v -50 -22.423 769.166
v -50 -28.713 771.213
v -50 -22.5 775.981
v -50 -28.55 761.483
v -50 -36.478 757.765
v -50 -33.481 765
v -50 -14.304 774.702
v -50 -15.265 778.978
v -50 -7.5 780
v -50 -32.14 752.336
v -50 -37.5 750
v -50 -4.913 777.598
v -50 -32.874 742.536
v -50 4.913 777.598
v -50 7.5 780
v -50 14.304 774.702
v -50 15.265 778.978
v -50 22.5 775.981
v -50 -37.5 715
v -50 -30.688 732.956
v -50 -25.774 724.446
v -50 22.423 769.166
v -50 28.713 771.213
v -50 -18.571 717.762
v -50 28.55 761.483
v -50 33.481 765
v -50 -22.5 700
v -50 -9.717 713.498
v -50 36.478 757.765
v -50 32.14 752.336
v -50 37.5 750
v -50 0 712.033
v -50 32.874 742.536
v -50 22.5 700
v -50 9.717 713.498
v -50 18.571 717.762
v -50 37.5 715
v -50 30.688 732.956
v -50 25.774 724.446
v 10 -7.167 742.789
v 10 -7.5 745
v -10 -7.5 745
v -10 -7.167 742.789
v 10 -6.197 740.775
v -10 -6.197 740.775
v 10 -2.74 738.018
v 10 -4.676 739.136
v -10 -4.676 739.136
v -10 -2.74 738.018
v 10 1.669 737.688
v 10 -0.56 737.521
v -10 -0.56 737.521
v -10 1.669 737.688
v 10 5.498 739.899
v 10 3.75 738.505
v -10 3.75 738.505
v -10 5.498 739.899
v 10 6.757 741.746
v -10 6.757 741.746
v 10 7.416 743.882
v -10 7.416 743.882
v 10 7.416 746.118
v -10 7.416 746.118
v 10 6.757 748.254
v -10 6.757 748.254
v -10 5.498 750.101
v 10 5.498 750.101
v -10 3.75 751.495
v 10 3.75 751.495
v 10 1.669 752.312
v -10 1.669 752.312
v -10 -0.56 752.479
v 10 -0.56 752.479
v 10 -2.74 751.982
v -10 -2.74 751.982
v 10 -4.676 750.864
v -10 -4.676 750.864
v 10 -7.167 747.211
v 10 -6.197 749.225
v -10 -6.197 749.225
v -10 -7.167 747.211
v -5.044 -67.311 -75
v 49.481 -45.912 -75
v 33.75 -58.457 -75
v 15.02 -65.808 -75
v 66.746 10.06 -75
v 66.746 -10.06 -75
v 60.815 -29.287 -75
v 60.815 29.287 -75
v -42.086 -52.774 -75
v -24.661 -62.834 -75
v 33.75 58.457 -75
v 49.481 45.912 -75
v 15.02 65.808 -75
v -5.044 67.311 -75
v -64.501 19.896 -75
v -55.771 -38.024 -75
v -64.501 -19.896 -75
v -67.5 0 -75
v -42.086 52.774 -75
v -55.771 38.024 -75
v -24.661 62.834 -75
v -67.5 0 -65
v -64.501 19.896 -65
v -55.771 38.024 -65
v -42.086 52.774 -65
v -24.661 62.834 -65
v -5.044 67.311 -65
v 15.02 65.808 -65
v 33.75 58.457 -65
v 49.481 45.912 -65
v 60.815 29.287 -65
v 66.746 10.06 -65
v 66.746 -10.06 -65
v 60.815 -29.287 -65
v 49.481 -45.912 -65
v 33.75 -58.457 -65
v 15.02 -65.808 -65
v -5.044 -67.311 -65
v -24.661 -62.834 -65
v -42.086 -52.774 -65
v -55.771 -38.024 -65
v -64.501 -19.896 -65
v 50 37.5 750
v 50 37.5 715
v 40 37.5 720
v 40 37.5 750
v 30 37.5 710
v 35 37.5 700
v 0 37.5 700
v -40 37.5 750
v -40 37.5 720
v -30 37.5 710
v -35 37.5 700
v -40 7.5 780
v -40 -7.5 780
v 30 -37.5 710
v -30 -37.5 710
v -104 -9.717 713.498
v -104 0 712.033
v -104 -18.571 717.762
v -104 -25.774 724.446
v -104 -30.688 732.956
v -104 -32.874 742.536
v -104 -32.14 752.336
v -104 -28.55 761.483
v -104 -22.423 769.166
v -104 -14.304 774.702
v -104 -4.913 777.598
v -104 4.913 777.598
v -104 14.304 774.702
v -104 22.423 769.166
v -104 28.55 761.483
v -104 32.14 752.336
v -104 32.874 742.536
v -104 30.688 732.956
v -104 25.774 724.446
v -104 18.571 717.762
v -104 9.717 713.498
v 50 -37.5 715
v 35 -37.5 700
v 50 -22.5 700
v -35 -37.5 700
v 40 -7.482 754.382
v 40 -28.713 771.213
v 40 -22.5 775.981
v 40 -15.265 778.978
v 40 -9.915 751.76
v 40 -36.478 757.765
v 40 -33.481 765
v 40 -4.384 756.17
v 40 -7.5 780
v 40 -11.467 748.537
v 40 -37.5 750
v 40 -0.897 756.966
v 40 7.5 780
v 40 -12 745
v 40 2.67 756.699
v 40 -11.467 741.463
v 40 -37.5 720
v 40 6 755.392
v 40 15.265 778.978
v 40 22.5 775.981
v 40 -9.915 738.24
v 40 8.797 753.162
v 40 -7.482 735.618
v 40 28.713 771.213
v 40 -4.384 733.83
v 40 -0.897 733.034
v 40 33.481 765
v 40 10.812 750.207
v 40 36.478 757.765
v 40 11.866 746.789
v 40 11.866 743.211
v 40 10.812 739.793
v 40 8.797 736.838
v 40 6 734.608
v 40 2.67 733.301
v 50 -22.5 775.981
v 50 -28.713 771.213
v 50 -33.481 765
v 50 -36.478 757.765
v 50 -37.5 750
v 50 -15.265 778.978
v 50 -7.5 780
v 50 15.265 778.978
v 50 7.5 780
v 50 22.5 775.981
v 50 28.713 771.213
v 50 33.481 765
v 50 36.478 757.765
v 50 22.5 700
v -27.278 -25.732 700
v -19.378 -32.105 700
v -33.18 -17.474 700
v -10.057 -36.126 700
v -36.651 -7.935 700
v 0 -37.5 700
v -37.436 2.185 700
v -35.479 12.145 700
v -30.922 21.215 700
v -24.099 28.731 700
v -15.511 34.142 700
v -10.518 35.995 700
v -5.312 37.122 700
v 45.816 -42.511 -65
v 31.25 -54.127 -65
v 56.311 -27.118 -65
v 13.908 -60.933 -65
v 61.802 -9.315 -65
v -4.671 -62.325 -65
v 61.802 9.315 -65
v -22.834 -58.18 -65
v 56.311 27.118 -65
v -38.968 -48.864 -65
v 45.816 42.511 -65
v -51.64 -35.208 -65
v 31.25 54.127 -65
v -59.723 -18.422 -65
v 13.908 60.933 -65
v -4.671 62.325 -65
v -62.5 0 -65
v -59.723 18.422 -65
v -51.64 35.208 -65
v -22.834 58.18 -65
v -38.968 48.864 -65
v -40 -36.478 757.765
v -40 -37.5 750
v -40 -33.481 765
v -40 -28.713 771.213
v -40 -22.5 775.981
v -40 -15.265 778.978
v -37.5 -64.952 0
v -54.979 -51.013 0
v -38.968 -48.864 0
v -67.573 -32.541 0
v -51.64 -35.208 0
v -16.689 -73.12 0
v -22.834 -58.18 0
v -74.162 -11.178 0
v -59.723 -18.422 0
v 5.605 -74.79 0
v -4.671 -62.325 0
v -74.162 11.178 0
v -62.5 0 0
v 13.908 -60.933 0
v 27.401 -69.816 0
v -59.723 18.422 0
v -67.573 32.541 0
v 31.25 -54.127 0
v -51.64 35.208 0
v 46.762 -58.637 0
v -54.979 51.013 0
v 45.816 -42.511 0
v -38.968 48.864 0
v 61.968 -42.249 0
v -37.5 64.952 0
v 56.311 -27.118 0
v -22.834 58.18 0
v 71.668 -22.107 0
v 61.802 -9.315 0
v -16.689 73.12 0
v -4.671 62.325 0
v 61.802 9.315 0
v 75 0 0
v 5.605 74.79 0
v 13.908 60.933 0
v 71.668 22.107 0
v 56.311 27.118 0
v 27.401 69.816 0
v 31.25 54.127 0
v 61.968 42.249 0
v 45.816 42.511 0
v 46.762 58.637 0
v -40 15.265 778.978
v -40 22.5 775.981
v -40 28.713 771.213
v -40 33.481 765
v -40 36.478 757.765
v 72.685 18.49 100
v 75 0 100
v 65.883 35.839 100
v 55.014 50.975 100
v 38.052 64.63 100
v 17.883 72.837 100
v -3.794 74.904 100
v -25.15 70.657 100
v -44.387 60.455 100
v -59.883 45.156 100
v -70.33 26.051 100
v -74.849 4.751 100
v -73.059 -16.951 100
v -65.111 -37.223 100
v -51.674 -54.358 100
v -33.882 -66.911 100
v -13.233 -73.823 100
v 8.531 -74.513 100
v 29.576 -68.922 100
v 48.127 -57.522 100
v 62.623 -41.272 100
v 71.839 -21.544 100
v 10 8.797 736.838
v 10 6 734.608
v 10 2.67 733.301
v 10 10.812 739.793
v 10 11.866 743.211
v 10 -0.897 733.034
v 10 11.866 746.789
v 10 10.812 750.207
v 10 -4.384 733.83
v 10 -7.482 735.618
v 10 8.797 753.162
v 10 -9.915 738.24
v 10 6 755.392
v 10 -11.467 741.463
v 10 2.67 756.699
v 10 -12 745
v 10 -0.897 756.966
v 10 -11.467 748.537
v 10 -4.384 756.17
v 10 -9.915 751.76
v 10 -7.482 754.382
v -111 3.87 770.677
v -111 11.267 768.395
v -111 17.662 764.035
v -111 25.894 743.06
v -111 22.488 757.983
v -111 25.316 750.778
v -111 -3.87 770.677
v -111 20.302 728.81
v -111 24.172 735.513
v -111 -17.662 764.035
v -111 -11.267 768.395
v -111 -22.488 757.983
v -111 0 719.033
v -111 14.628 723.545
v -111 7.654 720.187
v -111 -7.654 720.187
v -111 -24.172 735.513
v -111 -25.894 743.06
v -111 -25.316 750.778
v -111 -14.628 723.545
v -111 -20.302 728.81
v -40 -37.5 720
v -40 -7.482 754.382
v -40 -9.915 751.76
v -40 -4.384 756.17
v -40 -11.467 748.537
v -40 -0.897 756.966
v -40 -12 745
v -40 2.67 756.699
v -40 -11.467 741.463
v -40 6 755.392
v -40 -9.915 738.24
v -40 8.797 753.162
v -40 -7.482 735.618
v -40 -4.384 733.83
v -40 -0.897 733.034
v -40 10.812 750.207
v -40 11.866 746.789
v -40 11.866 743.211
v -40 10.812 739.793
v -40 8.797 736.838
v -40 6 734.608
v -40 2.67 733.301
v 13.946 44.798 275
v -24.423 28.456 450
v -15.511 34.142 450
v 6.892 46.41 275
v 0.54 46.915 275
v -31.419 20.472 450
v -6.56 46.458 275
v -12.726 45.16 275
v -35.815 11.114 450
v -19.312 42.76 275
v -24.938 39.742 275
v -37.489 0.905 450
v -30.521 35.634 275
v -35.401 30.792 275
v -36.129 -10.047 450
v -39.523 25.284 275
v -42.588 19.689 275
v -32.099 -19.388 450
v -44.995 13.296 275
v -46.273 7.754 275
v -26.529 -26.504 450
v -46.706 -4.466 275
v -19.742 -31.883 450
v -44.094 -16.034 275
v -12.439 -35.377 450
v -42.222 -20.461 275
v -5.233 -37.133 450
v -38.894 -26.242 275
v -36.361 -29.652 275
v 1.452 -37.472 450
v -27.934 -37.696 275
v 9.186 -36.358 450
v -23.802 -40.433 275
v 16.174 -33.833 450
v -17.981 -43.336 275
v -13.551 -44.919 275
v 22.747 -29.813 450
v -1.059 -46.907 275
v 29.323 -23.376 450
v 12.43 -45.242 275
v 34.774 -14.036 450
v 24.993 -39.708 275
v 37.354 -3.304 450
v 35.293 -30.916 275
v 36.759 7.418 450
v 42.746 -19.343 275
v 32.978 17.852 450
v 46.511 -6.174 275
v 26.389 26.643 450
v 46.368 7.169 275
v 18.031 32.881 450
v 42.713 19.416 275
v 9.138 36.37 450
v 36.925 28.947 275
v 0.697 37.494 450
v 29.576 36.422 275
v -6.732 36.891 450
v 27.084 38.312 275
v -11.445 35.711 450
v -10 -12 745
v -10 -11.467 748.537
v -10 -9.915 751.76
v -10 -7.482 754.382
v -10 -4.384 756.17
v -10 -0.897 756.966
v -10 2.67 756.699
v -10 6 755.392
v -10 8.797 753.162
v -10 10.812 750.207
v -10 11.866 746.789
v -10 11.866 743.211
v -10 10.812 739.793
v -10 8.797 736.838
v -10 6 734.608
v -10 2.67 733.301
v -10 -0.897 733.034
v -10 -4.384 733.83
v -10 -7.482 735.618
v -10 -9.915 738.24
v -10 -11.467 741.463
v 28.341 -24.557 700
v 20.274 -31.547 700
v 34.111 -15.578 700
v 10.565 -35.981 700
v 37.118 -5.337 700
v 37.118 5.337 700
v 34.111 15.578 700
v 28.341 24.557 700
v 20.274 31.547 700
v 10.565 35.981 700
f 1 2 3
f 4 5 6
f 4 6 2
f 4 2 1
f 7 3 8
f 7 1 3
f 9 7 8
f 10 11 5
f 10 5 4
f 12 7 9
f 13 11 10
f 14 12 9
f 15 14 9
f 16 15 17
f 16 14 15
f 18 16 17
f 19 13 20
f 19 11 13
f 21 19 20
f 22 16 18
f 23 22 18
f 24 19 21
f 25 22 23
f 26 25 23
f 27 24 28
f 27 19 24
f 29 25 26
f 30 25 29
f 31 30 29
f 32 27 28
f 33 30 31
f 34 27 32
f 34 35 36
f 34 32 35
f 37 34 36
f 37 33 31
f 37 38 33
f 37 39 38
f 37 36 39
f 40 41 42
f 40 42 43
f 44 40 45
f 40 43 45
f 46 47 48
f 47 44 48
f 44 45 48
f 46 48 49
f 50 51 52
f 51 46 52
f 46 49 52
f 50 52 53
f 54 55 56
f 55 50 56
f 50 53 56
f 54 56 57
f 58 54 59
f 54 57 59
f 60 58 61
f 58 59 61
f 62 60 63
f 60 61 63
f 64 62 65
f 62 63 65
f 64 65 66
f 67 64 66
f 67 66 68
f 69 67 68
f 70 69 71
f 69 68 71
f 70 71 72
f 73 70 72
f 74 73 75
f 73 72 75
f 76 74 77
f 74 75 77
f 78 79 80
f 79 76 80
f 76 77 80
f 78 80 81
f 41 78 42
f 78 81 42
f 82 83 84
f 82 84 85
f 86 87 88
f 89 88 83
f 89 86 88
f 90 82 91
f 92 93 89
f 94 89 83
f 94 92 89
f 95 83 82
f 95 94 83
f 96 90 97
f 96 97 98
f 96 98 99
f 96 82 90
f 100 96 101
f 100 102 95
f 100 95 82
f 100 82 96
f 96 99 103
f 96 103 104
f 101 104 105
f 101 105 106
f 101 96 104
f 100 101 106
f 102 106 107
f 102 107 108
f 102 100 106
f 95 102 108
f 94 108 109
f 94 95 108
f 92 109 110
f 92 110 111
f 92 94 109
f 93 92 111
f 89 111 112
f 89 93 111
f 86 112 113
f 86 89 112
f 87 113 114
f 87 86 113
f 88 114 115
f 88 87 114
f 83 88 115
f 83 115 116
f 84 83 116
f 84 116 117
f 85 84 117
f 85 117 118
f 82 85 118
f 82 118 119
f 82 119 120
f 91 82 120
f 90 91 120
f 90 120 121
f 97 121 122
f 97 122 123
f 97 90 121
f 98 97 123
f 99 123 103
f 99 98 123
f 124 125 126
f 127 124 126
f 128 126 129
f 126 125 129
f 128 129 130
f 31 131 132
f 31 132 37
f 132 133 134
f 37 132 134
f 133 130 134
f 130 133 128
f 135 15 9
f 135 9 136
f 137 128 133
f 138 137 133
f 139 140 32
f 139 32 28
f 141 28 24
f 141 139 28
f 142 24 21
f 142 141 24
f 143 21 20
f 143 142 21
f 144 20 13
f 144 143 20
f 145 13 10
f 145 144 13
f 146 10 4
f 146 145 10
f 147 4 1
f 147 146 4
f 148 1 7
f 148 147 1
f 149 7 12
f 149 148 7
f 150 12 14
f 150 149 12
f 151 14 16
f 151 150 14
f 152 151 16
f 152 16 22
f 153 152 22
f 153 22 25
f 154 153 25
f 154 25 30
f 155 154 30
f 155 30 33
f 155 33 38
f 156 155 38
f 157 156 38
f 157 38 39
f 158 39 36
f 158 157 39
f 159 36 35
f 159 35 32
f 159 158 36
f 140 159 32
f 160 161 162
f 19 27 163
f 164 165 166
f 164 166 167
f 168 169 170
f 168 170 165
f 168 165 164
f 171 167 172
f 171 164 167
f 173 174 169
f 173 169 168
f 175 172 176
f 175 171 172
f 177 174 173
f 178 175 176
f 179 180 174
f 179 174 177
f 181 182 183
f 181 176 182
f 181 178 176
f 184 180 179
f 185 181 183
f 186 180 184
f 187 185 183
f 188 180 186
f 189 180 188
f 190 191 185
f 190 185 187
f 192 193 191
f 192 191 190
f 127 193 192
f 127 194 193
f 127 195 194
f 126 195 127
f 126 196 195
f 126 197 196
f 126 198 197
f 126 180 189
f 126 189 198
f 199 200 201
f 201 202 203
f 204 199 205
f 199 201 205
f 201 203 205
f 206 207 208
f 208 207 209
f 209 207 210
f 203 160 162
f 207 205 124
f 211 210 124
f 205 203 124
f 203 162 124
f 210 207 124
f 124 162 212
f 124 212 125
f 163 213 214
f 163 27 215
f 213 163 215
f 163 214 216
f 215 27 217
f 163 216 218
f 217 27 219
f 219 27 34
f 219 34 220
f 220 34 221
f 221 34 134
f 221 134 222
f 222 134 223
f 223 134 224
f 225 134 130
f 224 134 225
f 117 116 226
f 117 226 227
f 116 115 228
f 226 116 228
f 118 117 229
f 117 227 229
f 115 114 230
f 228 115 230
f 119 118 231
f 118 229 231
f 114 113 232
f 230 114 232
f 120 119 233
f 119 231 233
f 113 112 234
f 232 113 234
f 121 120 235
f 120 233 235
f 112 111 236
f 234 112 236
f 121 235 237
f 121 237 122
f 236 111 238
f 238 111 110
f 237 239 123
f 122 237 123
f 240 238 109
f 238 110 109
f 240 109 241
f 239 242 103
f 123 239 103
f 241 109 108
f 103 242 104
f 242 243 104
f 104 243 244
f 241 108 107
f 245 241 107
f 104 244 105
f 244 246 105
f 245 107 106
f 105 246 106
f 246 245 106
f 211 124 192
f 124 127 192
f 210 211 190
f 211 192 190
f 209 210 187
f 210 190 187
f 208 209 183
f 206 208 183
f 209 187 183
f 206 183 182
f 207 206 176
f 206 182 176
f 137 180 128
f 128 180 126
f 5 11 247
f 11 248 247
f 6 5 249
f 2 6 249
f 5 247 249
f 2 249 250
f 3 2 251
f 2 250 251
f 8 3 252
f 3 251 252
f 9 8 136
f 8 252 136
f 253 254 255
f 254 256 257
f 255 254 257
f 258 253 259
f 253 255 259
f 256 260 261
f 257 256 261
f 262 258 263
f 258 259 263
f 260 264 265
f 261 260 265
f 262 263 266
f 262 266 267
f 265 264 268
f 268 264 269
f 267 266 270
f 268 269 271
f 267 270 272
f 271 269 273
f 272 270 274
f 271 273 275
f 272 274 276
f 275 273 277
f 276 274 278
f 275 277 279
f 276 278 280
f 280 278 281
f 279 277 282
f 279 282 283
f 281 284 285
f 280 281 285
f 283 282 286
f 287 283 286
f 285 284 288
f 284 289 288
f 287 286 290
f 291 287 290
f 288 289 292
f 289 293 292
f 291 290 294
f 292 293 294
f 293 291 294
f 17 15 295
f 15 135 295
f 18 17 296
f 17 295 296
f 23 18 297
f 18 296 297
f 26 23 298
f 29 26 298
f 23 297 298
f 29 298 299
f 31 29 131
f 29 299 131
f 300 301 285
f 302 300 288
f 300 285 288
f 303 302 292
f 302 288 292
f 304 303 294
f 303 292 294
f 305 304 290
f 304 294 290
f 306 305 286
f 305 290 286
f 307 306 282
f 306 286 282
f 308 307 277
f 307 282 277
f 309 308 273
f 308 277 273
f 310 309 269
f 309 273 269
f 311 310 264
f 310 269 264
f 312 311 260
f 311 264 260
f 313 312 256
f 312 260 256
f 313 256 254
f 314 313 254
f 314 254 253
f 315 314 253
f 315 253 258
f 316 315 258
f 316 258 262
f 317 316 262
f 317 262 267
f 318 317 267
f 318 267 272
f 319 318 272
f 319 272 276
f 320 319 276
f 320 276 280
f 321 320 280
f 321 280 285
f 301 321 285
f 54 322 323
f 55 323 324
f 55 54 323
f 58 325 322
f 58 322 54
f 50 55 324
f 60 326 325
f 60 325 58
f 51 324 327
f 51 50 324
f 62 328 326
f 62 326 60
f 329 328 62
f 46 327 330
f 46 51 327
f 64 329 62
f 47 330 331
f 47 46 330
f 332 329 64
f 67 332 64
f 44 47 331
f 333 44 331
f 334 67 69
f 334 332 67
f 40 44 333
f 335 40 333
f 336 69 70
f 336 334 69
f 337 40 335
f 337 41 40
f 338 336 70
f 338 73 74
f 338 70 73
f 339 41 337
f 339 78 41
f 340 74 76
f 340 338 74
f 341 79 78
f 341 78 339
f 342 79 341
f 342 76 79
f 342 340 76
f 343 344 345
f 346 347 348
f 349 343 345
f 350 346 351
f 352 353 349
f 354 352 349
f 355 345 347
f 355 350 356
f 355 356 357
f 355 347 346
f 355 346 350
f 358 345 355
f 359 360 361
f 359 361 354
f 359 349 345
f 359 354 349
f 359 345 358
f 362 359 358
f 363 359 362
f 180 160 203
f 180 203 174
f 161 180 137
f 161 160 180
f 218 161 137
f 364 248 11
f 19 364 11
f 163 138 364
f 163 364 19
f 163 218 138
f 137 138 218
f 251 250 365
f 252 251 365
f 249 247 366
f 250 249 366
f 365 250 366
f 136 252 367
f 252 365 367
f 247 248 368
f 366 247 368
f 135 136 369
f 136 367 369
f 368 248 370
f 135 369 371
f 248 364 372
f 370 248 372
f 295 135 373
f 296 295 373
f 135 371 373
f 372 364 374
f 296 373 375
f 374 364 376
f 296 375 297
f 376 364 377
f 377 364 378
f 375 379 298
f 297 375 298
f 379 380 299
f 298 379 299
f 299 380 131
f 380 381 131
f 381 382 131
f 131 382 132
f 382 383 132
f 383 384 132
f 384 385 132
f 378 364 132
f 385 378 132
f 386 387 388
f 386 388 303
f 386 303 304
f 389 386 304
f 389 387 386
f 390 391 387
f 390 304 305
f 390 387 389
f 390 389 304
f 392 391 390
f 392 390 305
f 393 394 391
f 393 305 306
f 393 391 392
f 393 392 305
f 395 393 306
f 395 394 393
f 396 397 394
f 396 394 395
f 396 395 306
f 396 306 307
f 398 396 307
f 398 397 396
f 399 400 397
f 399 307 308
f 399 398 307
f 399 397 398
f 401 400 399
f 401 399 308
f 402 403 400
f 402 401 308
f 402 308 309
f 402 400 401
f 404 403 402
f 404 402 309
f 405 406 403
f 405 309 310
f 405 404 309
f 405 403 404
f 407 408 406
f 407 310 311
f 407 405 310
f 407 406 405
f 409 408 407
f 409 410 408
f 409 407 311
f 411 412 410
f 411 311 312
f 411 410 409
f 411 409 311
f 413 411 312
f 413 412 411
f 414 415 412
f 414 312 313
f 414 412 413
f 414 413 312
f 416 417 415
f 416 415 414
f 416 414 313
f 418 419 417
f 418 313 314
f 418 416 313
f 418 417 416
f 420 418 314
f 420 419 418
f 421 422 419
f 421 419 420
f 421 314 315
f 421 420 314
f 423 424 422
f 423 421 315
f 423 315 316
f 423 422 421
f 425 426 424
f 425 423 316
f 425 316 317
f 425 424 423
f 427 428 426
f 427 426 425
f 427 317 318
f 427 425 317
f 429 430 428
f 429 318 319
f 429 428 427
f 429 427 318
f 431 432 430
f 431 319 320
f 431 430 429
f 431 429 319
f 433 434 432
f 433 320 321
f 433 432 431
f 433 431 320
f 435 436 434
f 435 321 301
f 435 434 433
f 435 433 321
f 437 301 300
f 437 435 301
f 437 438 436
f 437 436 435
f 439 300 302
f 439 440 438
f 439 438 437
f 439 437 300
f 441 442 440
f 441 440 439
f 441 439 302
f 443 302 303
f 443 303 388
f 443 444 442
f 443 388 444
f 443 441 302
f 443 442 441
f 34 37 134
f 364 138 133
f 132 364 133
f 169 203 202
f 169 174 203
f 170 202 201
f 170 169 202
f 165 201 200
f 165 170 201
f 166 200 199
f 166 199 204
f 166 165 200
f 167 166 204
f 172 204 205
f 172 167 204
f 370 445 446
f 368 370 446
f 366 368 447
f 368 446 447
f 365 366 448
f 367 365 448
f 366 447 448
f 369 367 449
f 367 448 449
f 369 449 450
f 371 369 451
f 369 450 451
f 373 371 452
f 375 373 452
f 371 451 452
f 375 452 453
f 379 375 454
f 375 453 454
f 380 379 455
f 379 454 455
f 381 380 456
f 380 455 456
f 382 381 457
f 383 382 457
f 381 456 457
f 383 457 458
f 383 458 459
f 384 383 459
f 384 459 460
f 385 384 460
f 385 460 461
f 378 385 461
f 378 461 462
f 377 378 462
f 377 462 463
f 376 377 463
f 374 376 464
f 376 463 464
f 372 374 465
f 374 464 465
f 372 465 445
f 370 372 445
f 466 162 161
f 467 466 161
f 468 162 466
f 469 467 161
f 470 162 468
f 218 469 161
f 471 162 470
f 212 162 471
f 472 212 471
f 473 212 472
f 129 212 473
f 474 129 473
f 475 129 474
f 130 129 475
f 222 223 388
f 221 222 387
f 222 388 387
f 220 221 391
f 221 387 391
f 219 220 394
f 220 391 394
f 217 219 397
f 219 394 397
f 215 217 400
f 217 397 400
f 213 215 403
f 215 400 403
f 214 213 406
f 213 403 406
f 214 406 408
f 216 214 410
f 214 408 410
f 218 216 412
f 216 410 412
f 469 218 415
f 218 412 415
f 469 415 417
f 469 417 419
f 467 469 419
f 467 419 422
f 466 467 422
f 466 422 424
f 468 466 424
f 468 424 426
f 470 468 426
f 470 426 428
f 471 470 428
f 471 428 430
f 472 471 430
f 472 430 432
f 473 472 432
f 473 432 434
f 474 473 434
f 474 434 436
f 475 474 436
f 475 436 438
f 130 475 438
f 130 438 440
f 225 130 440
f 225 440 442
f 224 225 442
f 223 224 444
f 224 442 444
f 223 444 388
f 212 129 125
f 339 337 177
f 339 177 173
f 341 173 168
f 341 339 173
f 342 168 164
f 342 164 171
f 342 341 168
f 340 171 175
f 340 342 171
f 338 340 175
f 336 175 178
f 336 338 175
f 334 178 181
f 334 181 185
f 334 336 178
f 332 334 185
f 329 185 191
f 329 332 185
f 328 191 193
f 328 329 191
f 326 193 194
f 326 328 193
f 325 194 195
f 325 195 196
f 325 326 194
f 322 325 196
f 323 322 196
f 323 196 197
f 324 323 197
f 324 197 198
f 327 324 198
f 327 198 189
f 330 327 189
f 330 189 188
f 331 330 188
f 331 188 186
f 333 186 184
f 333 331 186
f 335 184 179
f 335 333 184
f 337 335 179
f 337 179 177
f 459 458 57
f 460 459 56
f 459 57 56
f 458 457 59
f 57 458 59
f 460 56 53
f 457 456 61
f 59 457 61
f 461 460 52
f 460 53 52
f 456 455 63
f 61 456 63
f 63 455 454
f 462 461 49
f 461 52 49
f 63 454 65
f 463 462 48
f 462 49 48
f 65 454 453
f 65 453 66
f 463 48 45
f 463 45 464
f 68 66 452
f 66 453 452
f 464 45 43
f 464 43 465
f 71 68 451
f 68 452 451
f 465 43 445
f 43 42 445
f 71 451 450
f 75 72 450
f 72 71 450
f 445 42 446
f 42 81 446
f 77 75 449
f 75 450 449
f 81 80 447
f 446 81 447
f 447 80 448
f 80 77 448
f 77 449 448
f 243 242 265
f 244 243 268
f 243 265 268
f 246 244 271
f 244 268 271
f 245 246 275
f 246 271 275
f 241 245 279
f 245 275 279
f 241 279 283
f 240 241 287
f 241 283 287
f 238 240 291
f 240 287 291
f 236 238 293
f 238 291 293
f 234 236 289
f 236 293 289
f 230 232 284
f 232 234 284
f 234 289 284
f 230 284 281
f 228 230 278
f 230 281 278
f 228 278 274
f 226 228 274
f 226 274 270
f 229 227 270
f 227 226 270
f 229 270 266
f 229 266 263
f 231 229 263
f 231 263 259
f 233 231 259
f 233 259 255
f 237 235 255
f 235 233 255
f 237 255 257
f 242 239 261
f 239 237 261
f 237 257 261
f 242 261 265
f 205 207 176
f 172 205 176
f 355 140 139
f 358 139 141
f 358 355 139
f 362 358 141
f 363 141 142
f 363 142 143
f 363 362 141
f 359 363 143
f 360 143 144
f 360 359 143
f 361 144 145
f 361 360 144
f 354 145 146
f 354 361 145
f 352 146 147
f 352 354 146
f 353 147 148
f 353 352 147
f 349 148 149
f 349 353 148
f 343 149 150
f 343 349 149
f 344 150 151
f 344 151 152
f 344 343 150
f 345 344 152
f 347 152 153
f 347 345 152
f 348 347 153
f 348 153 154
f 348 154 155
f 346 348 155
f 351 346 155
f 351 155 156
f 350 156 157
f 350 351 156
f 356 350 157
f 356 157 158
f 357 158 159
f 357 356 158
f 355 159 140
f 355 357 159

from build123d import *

# Parameters (mm, degrees)
SKETCH1_R           = 75
BOSS_EXTRUDE1_DEPTH = 100
SKETCH3_R           = 37.5
BOSS_EXTRUDE2_DEPTH = 250
SKETCH4_R           = 62.5
BOSS_EXTRUDE3_DEPTH = 75
SKETCH5_W           = 50
SKETCH5_H           = 75
BOSS_EXTRUDE4_DEPTH = 10
SKETCH6_W           = 10
SKETCH6_H           = 75
BOSS_EXTRUDE5_DEPTH = 70
SKETCH7_R           = 7.5
BOSS_EXTRUDE6_DEPTH = 40
BOSS_EXTRUDE7_START = 61
SKETCH8_R           = 32.966655639
SKETCH8_R_2         = 7.5
BOSS_EXTRUDE7_DEPTH = 61
CHAMFER2_SIZE       = 7
BOSS_EXTRUDE8_START = 30
SKETCH9_R           = 12
SKETCH9_R_2         = 7.5
BOSS_EXTRUDE8_DEPTH = 30
FILLET1_R           = 30
CHAMFER4_SIZE       = 10
CHAMFER5_START      = 353
CHAMFER5_OUTLINE_W  = 21
CHAMFER5_OUTLINE_H  = 25
CHAMFER5_DEPTH      = 9.287293916
CHAMFER6_START      = 353
CHAMFER6_OUTLINE_W  = 21
CHAMFER6_OUTLINE_H  = 25
CHAMFER6_DEPTH      = 9.287293916
CHAMFER7_START      = -362.287293916
CHAMFER7_OUTLINE_W  = 21
CHAMFER7_OUTLINE_H  = 25
CHAMFER7_DEPTH      = 9.287293916
CHAMFER8_START      = -362.287293916
CHAMFER8_OUTLINE_W  = 21
CHAMFER8_OUTLINE_H  = 25
CHAMFER8_DEPTH      = 9.287293916
SKETCH10_R          = 67.5
BOSS_EXTRUDE9_DEPTH = 10


with BuildPart() as part:
    # Sketch1 → Boss-Extrude1 (new body)
    with BuildSketch(Plane.XY):
        Circle(SKETCH1_R)
    extrude(amount=BOSS_EXTRUDE1_DEPTH)

    # Loft1: read off the stored shape, not the designer's step
    # Loft1: loft between two sections, ruled curve by curve
    loft1_from = [
        Edge.make_bspline([(55.013686164, 50.975428734, 100), (-46.937171304, 161.002801063, 100), (-156.964543632, 59.051943595, 100), (-55.013686164, -50.975428734, 100), (46.937171304, -161.002801063, 100), (156.964543632, -59.051943595, 100), (55.013686164, 50.975428734, 100)], [0, 0, 0, 0, 0.5, 0.5, 0.5, 1, 1, 1, 1], 3, [1, 0.333333333, 0.333333333, 1, 0.333333333, 0.333333333, 1]),
    ]
    loft1_to = [
        Edge.make_bspline([(-15.510833372, 34.141822566, 450), (-83.794478503, 3.120155821, 450), (-52.772811759, -65.16348931, 450), (15.510833372, -34.141822566, 450), (83.794478503, -3.120155821, 450), (52.772811759, 65.16348931, 450), (-15.510833372, 34.141822566, 450)], [0, 0, 0, 0, 0.5, 0.5, 0.5, 1, 1, 1, 1], 3, [1, 0.333333333, 0.333333333, 1, 0.333333333, 0.333333333, 1]),
    ]
    loft1 = Solid(Shell([*[Face.make_surface_from_curves(loft1_from[k], loft1_to[k]) for k in range(1)], Face(Wire(loft1_from)), Face(Wire(loft1_to))]))
    add(loft1)

    # Sketch3 → Boss-Extrude2 (add)
    with BuildSketch(Plane.XY.offset(450)):
        with Locations(Location((0, 0, 0), (0, 0, 114.432581244))):
            Circle(SKETCH3_R)
    extrude(amount=BOSS_EXTRUDE2_DEPTH)

    # Sketch4 → Boss-Extrude3 (add)
    with BuildSketch(Plane(origin=(0, 0, 0), x_dir=(-1, 0, 0), z_dir=(0, 0, -1))):
        Circle(SKETCH4_R)
    extrude(amount=BOSS_EXTRUDE3_DEPTH)

    # Sketch5 → Boss-Extrude4 (add)
    with BuildSketch(Plane.XY.offset(700)):
        with Locations((-25, 0)):
            Rectangle(SKETCH5_W, SKETCH5_H)
    boss_extrude4 = extrude(amount=BOSS_EXTRUDE4_DEPTH)

    # Sketch6 → Boss-Extrude5 (add)
    with BuildSketch(Plane.XY.offset(710)):
        with Locations((-45, 0)):
            Rectangle(SKETCH6_W, SKETCH6_H)
    boss_extrude5 = extrude(amount=BOSS_EXTRUDE5_DEPTH)

    # Sketch7 → Boss-Extrude6 (add)
    with BuildSketch(Plane(origin=(-40, 0, 0), x_dir=(0, 0, -1), z_dir=(1, 0, 0))):
        with Locations(Location((-745, 0, 0), (0, 0, 270))):
            Circle(SKETCH7_R)
    boss_extrude6 = extrude(amount=BOSS_EXTRUDE6_DEPTH)

    # Mirror1: Boss-Extrude4, Boss-Extrude5, Boss-Extrude6 across plane
    add(boss_extrude4.mirror(Plane(origin=(0, 0, 710), x_dir=(0, 0, 1), z_dir=(-1, 0, 0))))
    add(boss_extrude5.mirror(Plane(origin=(0, 0, 710), x_dir=(0, 0, 1), z_dir=(-1, 0, 0))))
    add(boss_extrude6.mirror(Plane(origin=(0, 0, 710), x_dir=(0, 0, 1), z_dir=(-1, 0, 0))))

    # Sketch8 → Boss-Extrude7 (add)
    # profile 1 of 2: a face of its own
    with BuildSketch(Plane.ZY.offset(50).offset(BOSS_EXTRUDE7_START)):
        with Locations(Location((745, 0, 0), (0, 0, 180))):
            Circle(SKETCH8_R)
        with Locations(Location((745, 0, 0), (0, 0, 270))):
            Circle(SKETCH8_R_2, mode=Mode.SUBTRACT)
    # profile 2 of 2: a face of its own
    with BuildSketch(Plane.ZY.offset(50).offset(BOSS_EXTRUDE7_START)):
        with Locations(Location((745, 0, 0), (0, 0, 270))):
            Circle(SKETCH8_R_2)
    extrude(amount=-BOSS_EXTRUDE7_DEPTH)

    # Chamfer2
    chamfer2_edges = [part.edges().sort_by_distance(p)[0] for p in [
        (-111, 0, 777.966655639),
    ]]
    chamfer(chamfer2_edges, length=CHAMFER2_SIZE)

    # Sketch9 → Boss-Extrude8 (add)
    with BuildSketch(Plane.ZY.offset(-40).offset(BOSS_EXTRUDE8_START)):
        with Locations(Location((745, 0, 0), (0, 0, 270))):
            Circle(SKETCH9_R)
        with Locations(Location((745, 0, 0), (0, 0, 270))):
            Circle(SKETCH9_R_2, mode=Mode.SUBTRACT)
    boss_extrude8 = extrude(amount=-BOSS_EXTRUDE8_DEPTH)

    # Mirror2: Boss-Extrude8 across plane
    add(boss_extrude8.mirror(Plane(origin=(0, 0, 0), x_dir=(0, 0, 1), z_dir=(1, 0, 0))))

    # Fillet1
    fillet1_edges = [part.edges().sort_by_distance(p)[0] for p in [
        (-45, -37.5, 780),
        (-45, 37.5, 780),
        (45, 37.5, 780),
        (45, -37.5, 780),
    ]]
    fillet(fillet1_edges, radius=FILLET1_R)

    # Chamfer4
    chamfer4_edges = [part.edges().sort_by_distance(p)[0] for p in [
        (-40, 0, 710),
        (40, 0, 710),
    ]]
    chamfer(chamfer4_edges, length=CHAMFER4_SIZE)

    # Chamfer5: read off the stored shape, not the designer's step
    # Chamfer5 outline → Chamfer5 (cut)
    with BuildSketch(Plane(origin=(0, 0, 0), x_dir=(0.8164965809277258, 0.40824829046386313, -0.40824829046386313), z_dir=(0.5773502691896258, -0.5773502691896258, 0.5773502691896258)).offset(CHAMFER5_START)):
        with Locations((-308.5, 521.5)):
            Rectangle(CHAMFER5_OUTLINE_W, CHAMFER5_OUTLINE_H)
    extrude(amount=CHAMFER5_DEPTH, mode=Mode.SUBTRACT)

    # Chamfer6: read off the stored shape, not the designer's step
    # Chamfer6 outline → Chamfer6 (cut)
    with BuildSketch(Plane(origin=(0, 0, 0), x_dir=(0.8164965809277258, -0.40824829046386313, -0.40824829046386313), z_dir=(0.5773502691896258, 0.5773502691896258, 0.5773502691896258)).offset(CHAMFER6_START)):
        with Locations((-308.5, -521.5)):
            Rectangle(CHAMFER6_OUTLINE_W, CHAMFER6_OUTLINE_H)
    extrude(amount=CHAMFER6_DEPTH, mode=Mode.SUBTRACT)

    # Chamfer7: read off the stored shape, not the designer's step
    # Chamfer7 outline → Chamfer7 (cut)
    with BuildSketch(Plane(origin=(0, 0, 0), x_dir=(0.8164965809277258, -0.40824829046386313, 0.40824829046386313), z_dir=(0.5773502691896258, 0.5773502691896258, -0.5773502691896258)).offset(CHAMFER7_START)):
        with Locations((308.5, -521.5)):
            Rectangle(CHAMFER7_OUTLINE_W, CHAMFER7_OUTLINE_H)
    extrude(amount=CHAMFER7_DEPTH, mode=Mode.SUBTRACT)

    # Chamfer8: read off the stored shape, not the designer's step
    # Chamfer8 outline → Chamfer8 (cut)
    with BuildSketch(Plane(origin=(0, 0, 0), x_dir=(0.8164965809277258, 0.40824829046386313, 0.40824829046386313), z_dir=(0.5773502691896258, -0.5773502691896258, -0.5773502691896258)).offset(CHAMFER8_START)):
        with Locations((308.5, 521.5)):
            Rectangle(CHAMFER8_OUTLINE_W, CHAMFER8_OUTLINE_H)
    extrude(amount=CHAMFER8_DEPTH, mode=Mode.SUBTRACT)

    # Sketch10 → Boss-Extrude9 (add)
    with BuildSketch(Plane(origin=(0, 0, -75), x_dir=(-1, 0, 0), z_dir=(0, 0, -1))):
        Circle(SKETCH10_R)
    extrude(amount=-BOSS_EXTRUDE9_DEPTH)


solid = part.part
